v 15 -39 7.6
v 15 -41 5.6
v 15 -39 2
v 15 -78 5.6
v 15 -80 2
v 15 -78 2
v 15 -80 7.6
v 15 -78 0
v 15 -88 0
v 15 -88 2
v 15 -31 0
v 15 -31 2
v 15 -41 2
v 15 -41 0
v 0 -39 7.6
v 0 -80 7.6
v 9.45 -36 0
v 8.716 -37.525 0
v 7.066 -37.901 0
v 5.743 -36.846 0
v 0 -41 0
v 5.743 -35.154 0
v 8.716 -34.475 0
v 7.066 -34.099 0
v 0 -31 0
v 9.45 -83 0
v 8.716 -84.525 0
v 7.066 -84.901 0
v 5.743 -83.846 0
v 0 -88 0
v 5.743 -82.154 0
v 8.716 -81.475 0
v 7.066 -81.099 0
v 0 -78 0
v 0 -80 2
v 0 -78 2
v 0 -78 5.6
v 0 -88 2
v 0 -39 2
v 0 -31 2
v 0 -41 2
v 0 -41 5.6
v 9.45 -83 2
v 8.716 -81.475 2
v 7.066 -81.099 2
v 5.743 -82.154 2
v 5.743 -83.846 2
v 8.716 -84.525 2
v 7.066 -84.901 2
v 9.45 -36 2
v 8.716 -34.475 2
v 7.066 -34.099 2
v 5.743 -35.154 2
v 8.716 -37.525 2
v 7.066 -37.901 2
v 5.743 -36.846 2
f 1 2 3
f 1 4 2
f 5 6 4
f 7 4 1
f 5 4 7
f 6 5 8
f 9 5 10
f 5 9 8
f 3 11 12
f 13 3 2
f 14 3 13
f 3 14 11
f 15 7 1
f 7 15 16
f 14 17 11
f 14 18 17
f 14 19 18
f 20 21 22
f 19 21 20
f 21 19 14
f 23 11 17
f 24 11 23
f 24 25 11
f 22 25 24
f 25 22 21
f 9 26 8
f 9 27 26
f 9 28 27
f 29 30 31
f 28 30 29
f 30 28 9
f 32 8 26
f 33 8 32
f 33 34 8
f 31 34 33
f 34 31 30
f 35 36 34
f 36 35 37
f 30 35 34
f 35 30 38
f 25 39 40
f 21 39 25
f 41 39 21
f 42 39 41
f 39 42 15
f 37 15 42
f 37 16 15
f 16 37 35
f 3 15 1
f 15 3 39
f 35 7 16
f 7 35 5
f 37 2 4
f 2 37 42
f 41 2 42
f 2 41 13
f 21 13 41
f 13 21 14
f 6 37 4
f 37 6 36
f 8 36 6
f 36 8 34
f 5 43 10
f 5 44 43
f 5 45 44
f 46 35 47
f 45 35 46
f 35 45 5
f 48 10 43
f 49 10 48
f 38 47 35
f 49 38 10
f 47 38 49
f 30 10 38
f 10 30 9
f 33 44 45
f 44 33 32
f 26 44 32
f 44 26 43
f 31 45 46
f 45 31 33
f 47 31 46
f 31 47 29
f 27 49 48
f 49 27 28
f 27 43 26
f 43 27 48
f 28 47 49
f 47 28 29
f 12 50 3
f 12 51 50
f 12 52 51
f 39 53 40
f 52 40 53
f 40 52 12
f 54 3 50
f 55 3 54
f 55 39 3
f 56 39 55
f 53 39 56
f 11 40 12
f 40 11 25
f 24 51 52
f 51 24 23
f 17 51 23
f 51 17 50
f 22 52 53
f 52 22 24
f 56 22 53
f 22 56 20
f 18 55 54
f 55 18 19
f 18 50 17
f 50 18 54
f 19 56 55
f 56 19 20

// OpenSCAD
connector = 10;
width = 15;
thick = 4.5;

module arm(){ 
    translate([5,5,0])
    rotate([0,0,90])
     minkowski(){
        cube([18,width - 10,thick]);
        cylinder(r=5,h=1,center=true);
    }

 
    translate([5,5,8])
    rotate([0,0,90])
     minkowski(){
        cube([18,width - 10,thick]);
        cylinder(r=5,h=1,center=true);
    }

    translate([5,5,0])
    rotate([0,0,90])
     minkowski(){
        cube([2,width - 10,12]);
        cylinder(r=5,h=1,center=true);
    }

    translate([5,5,0])
    rotate([0,0,45])
    translate([-80,0,0])
    union(){ 
        minkowski(){
            cube([80,width - 10,thick]);
            cylinder(r=5,h=1,center=true);
        }
        /*translate([0,0,thick])
        cube([80,4,4]);*/
    }

    translate([-40,-87,0])
    rotate([0,0,-65])
    translate([-40,0,0])
    difference(){
         minkowski(){
            cube([80,width - 10,thick]);
            cylinder(r=5,h=1,center=true);
        }
        translate([75,(width-10)/2,0])
        cylinder(h=30,r=1.95,center=true);
        translate([75 - 47,(width-10)/2,0])
        cylinder(h=30,r=1.95,center=true);
    }
}
/*
difference(){
    arm();
    translate([2.5,21,0])
    rotate([0,0,0])
    cylinder(r=1.95,h=30);
}*/

translate([0,-80,0])
union(){
    difference(){
        cube([width,41,7.6]);
        translate([0,2,0])
        cube([width,37,5.6]);
    }
    translate([0,-8,0])
    difference(){
        cube([width,10,2]);
        translate([width/2,5,0])
        cylinder(r=1.95,h=30,center=true);
    }
    translate([0,39,0])
    difference(){
        cube([width,10,2]);
        translate([width/2,5,0])
        cylinder(r=1.95,h=30,center=true);
    }
}
